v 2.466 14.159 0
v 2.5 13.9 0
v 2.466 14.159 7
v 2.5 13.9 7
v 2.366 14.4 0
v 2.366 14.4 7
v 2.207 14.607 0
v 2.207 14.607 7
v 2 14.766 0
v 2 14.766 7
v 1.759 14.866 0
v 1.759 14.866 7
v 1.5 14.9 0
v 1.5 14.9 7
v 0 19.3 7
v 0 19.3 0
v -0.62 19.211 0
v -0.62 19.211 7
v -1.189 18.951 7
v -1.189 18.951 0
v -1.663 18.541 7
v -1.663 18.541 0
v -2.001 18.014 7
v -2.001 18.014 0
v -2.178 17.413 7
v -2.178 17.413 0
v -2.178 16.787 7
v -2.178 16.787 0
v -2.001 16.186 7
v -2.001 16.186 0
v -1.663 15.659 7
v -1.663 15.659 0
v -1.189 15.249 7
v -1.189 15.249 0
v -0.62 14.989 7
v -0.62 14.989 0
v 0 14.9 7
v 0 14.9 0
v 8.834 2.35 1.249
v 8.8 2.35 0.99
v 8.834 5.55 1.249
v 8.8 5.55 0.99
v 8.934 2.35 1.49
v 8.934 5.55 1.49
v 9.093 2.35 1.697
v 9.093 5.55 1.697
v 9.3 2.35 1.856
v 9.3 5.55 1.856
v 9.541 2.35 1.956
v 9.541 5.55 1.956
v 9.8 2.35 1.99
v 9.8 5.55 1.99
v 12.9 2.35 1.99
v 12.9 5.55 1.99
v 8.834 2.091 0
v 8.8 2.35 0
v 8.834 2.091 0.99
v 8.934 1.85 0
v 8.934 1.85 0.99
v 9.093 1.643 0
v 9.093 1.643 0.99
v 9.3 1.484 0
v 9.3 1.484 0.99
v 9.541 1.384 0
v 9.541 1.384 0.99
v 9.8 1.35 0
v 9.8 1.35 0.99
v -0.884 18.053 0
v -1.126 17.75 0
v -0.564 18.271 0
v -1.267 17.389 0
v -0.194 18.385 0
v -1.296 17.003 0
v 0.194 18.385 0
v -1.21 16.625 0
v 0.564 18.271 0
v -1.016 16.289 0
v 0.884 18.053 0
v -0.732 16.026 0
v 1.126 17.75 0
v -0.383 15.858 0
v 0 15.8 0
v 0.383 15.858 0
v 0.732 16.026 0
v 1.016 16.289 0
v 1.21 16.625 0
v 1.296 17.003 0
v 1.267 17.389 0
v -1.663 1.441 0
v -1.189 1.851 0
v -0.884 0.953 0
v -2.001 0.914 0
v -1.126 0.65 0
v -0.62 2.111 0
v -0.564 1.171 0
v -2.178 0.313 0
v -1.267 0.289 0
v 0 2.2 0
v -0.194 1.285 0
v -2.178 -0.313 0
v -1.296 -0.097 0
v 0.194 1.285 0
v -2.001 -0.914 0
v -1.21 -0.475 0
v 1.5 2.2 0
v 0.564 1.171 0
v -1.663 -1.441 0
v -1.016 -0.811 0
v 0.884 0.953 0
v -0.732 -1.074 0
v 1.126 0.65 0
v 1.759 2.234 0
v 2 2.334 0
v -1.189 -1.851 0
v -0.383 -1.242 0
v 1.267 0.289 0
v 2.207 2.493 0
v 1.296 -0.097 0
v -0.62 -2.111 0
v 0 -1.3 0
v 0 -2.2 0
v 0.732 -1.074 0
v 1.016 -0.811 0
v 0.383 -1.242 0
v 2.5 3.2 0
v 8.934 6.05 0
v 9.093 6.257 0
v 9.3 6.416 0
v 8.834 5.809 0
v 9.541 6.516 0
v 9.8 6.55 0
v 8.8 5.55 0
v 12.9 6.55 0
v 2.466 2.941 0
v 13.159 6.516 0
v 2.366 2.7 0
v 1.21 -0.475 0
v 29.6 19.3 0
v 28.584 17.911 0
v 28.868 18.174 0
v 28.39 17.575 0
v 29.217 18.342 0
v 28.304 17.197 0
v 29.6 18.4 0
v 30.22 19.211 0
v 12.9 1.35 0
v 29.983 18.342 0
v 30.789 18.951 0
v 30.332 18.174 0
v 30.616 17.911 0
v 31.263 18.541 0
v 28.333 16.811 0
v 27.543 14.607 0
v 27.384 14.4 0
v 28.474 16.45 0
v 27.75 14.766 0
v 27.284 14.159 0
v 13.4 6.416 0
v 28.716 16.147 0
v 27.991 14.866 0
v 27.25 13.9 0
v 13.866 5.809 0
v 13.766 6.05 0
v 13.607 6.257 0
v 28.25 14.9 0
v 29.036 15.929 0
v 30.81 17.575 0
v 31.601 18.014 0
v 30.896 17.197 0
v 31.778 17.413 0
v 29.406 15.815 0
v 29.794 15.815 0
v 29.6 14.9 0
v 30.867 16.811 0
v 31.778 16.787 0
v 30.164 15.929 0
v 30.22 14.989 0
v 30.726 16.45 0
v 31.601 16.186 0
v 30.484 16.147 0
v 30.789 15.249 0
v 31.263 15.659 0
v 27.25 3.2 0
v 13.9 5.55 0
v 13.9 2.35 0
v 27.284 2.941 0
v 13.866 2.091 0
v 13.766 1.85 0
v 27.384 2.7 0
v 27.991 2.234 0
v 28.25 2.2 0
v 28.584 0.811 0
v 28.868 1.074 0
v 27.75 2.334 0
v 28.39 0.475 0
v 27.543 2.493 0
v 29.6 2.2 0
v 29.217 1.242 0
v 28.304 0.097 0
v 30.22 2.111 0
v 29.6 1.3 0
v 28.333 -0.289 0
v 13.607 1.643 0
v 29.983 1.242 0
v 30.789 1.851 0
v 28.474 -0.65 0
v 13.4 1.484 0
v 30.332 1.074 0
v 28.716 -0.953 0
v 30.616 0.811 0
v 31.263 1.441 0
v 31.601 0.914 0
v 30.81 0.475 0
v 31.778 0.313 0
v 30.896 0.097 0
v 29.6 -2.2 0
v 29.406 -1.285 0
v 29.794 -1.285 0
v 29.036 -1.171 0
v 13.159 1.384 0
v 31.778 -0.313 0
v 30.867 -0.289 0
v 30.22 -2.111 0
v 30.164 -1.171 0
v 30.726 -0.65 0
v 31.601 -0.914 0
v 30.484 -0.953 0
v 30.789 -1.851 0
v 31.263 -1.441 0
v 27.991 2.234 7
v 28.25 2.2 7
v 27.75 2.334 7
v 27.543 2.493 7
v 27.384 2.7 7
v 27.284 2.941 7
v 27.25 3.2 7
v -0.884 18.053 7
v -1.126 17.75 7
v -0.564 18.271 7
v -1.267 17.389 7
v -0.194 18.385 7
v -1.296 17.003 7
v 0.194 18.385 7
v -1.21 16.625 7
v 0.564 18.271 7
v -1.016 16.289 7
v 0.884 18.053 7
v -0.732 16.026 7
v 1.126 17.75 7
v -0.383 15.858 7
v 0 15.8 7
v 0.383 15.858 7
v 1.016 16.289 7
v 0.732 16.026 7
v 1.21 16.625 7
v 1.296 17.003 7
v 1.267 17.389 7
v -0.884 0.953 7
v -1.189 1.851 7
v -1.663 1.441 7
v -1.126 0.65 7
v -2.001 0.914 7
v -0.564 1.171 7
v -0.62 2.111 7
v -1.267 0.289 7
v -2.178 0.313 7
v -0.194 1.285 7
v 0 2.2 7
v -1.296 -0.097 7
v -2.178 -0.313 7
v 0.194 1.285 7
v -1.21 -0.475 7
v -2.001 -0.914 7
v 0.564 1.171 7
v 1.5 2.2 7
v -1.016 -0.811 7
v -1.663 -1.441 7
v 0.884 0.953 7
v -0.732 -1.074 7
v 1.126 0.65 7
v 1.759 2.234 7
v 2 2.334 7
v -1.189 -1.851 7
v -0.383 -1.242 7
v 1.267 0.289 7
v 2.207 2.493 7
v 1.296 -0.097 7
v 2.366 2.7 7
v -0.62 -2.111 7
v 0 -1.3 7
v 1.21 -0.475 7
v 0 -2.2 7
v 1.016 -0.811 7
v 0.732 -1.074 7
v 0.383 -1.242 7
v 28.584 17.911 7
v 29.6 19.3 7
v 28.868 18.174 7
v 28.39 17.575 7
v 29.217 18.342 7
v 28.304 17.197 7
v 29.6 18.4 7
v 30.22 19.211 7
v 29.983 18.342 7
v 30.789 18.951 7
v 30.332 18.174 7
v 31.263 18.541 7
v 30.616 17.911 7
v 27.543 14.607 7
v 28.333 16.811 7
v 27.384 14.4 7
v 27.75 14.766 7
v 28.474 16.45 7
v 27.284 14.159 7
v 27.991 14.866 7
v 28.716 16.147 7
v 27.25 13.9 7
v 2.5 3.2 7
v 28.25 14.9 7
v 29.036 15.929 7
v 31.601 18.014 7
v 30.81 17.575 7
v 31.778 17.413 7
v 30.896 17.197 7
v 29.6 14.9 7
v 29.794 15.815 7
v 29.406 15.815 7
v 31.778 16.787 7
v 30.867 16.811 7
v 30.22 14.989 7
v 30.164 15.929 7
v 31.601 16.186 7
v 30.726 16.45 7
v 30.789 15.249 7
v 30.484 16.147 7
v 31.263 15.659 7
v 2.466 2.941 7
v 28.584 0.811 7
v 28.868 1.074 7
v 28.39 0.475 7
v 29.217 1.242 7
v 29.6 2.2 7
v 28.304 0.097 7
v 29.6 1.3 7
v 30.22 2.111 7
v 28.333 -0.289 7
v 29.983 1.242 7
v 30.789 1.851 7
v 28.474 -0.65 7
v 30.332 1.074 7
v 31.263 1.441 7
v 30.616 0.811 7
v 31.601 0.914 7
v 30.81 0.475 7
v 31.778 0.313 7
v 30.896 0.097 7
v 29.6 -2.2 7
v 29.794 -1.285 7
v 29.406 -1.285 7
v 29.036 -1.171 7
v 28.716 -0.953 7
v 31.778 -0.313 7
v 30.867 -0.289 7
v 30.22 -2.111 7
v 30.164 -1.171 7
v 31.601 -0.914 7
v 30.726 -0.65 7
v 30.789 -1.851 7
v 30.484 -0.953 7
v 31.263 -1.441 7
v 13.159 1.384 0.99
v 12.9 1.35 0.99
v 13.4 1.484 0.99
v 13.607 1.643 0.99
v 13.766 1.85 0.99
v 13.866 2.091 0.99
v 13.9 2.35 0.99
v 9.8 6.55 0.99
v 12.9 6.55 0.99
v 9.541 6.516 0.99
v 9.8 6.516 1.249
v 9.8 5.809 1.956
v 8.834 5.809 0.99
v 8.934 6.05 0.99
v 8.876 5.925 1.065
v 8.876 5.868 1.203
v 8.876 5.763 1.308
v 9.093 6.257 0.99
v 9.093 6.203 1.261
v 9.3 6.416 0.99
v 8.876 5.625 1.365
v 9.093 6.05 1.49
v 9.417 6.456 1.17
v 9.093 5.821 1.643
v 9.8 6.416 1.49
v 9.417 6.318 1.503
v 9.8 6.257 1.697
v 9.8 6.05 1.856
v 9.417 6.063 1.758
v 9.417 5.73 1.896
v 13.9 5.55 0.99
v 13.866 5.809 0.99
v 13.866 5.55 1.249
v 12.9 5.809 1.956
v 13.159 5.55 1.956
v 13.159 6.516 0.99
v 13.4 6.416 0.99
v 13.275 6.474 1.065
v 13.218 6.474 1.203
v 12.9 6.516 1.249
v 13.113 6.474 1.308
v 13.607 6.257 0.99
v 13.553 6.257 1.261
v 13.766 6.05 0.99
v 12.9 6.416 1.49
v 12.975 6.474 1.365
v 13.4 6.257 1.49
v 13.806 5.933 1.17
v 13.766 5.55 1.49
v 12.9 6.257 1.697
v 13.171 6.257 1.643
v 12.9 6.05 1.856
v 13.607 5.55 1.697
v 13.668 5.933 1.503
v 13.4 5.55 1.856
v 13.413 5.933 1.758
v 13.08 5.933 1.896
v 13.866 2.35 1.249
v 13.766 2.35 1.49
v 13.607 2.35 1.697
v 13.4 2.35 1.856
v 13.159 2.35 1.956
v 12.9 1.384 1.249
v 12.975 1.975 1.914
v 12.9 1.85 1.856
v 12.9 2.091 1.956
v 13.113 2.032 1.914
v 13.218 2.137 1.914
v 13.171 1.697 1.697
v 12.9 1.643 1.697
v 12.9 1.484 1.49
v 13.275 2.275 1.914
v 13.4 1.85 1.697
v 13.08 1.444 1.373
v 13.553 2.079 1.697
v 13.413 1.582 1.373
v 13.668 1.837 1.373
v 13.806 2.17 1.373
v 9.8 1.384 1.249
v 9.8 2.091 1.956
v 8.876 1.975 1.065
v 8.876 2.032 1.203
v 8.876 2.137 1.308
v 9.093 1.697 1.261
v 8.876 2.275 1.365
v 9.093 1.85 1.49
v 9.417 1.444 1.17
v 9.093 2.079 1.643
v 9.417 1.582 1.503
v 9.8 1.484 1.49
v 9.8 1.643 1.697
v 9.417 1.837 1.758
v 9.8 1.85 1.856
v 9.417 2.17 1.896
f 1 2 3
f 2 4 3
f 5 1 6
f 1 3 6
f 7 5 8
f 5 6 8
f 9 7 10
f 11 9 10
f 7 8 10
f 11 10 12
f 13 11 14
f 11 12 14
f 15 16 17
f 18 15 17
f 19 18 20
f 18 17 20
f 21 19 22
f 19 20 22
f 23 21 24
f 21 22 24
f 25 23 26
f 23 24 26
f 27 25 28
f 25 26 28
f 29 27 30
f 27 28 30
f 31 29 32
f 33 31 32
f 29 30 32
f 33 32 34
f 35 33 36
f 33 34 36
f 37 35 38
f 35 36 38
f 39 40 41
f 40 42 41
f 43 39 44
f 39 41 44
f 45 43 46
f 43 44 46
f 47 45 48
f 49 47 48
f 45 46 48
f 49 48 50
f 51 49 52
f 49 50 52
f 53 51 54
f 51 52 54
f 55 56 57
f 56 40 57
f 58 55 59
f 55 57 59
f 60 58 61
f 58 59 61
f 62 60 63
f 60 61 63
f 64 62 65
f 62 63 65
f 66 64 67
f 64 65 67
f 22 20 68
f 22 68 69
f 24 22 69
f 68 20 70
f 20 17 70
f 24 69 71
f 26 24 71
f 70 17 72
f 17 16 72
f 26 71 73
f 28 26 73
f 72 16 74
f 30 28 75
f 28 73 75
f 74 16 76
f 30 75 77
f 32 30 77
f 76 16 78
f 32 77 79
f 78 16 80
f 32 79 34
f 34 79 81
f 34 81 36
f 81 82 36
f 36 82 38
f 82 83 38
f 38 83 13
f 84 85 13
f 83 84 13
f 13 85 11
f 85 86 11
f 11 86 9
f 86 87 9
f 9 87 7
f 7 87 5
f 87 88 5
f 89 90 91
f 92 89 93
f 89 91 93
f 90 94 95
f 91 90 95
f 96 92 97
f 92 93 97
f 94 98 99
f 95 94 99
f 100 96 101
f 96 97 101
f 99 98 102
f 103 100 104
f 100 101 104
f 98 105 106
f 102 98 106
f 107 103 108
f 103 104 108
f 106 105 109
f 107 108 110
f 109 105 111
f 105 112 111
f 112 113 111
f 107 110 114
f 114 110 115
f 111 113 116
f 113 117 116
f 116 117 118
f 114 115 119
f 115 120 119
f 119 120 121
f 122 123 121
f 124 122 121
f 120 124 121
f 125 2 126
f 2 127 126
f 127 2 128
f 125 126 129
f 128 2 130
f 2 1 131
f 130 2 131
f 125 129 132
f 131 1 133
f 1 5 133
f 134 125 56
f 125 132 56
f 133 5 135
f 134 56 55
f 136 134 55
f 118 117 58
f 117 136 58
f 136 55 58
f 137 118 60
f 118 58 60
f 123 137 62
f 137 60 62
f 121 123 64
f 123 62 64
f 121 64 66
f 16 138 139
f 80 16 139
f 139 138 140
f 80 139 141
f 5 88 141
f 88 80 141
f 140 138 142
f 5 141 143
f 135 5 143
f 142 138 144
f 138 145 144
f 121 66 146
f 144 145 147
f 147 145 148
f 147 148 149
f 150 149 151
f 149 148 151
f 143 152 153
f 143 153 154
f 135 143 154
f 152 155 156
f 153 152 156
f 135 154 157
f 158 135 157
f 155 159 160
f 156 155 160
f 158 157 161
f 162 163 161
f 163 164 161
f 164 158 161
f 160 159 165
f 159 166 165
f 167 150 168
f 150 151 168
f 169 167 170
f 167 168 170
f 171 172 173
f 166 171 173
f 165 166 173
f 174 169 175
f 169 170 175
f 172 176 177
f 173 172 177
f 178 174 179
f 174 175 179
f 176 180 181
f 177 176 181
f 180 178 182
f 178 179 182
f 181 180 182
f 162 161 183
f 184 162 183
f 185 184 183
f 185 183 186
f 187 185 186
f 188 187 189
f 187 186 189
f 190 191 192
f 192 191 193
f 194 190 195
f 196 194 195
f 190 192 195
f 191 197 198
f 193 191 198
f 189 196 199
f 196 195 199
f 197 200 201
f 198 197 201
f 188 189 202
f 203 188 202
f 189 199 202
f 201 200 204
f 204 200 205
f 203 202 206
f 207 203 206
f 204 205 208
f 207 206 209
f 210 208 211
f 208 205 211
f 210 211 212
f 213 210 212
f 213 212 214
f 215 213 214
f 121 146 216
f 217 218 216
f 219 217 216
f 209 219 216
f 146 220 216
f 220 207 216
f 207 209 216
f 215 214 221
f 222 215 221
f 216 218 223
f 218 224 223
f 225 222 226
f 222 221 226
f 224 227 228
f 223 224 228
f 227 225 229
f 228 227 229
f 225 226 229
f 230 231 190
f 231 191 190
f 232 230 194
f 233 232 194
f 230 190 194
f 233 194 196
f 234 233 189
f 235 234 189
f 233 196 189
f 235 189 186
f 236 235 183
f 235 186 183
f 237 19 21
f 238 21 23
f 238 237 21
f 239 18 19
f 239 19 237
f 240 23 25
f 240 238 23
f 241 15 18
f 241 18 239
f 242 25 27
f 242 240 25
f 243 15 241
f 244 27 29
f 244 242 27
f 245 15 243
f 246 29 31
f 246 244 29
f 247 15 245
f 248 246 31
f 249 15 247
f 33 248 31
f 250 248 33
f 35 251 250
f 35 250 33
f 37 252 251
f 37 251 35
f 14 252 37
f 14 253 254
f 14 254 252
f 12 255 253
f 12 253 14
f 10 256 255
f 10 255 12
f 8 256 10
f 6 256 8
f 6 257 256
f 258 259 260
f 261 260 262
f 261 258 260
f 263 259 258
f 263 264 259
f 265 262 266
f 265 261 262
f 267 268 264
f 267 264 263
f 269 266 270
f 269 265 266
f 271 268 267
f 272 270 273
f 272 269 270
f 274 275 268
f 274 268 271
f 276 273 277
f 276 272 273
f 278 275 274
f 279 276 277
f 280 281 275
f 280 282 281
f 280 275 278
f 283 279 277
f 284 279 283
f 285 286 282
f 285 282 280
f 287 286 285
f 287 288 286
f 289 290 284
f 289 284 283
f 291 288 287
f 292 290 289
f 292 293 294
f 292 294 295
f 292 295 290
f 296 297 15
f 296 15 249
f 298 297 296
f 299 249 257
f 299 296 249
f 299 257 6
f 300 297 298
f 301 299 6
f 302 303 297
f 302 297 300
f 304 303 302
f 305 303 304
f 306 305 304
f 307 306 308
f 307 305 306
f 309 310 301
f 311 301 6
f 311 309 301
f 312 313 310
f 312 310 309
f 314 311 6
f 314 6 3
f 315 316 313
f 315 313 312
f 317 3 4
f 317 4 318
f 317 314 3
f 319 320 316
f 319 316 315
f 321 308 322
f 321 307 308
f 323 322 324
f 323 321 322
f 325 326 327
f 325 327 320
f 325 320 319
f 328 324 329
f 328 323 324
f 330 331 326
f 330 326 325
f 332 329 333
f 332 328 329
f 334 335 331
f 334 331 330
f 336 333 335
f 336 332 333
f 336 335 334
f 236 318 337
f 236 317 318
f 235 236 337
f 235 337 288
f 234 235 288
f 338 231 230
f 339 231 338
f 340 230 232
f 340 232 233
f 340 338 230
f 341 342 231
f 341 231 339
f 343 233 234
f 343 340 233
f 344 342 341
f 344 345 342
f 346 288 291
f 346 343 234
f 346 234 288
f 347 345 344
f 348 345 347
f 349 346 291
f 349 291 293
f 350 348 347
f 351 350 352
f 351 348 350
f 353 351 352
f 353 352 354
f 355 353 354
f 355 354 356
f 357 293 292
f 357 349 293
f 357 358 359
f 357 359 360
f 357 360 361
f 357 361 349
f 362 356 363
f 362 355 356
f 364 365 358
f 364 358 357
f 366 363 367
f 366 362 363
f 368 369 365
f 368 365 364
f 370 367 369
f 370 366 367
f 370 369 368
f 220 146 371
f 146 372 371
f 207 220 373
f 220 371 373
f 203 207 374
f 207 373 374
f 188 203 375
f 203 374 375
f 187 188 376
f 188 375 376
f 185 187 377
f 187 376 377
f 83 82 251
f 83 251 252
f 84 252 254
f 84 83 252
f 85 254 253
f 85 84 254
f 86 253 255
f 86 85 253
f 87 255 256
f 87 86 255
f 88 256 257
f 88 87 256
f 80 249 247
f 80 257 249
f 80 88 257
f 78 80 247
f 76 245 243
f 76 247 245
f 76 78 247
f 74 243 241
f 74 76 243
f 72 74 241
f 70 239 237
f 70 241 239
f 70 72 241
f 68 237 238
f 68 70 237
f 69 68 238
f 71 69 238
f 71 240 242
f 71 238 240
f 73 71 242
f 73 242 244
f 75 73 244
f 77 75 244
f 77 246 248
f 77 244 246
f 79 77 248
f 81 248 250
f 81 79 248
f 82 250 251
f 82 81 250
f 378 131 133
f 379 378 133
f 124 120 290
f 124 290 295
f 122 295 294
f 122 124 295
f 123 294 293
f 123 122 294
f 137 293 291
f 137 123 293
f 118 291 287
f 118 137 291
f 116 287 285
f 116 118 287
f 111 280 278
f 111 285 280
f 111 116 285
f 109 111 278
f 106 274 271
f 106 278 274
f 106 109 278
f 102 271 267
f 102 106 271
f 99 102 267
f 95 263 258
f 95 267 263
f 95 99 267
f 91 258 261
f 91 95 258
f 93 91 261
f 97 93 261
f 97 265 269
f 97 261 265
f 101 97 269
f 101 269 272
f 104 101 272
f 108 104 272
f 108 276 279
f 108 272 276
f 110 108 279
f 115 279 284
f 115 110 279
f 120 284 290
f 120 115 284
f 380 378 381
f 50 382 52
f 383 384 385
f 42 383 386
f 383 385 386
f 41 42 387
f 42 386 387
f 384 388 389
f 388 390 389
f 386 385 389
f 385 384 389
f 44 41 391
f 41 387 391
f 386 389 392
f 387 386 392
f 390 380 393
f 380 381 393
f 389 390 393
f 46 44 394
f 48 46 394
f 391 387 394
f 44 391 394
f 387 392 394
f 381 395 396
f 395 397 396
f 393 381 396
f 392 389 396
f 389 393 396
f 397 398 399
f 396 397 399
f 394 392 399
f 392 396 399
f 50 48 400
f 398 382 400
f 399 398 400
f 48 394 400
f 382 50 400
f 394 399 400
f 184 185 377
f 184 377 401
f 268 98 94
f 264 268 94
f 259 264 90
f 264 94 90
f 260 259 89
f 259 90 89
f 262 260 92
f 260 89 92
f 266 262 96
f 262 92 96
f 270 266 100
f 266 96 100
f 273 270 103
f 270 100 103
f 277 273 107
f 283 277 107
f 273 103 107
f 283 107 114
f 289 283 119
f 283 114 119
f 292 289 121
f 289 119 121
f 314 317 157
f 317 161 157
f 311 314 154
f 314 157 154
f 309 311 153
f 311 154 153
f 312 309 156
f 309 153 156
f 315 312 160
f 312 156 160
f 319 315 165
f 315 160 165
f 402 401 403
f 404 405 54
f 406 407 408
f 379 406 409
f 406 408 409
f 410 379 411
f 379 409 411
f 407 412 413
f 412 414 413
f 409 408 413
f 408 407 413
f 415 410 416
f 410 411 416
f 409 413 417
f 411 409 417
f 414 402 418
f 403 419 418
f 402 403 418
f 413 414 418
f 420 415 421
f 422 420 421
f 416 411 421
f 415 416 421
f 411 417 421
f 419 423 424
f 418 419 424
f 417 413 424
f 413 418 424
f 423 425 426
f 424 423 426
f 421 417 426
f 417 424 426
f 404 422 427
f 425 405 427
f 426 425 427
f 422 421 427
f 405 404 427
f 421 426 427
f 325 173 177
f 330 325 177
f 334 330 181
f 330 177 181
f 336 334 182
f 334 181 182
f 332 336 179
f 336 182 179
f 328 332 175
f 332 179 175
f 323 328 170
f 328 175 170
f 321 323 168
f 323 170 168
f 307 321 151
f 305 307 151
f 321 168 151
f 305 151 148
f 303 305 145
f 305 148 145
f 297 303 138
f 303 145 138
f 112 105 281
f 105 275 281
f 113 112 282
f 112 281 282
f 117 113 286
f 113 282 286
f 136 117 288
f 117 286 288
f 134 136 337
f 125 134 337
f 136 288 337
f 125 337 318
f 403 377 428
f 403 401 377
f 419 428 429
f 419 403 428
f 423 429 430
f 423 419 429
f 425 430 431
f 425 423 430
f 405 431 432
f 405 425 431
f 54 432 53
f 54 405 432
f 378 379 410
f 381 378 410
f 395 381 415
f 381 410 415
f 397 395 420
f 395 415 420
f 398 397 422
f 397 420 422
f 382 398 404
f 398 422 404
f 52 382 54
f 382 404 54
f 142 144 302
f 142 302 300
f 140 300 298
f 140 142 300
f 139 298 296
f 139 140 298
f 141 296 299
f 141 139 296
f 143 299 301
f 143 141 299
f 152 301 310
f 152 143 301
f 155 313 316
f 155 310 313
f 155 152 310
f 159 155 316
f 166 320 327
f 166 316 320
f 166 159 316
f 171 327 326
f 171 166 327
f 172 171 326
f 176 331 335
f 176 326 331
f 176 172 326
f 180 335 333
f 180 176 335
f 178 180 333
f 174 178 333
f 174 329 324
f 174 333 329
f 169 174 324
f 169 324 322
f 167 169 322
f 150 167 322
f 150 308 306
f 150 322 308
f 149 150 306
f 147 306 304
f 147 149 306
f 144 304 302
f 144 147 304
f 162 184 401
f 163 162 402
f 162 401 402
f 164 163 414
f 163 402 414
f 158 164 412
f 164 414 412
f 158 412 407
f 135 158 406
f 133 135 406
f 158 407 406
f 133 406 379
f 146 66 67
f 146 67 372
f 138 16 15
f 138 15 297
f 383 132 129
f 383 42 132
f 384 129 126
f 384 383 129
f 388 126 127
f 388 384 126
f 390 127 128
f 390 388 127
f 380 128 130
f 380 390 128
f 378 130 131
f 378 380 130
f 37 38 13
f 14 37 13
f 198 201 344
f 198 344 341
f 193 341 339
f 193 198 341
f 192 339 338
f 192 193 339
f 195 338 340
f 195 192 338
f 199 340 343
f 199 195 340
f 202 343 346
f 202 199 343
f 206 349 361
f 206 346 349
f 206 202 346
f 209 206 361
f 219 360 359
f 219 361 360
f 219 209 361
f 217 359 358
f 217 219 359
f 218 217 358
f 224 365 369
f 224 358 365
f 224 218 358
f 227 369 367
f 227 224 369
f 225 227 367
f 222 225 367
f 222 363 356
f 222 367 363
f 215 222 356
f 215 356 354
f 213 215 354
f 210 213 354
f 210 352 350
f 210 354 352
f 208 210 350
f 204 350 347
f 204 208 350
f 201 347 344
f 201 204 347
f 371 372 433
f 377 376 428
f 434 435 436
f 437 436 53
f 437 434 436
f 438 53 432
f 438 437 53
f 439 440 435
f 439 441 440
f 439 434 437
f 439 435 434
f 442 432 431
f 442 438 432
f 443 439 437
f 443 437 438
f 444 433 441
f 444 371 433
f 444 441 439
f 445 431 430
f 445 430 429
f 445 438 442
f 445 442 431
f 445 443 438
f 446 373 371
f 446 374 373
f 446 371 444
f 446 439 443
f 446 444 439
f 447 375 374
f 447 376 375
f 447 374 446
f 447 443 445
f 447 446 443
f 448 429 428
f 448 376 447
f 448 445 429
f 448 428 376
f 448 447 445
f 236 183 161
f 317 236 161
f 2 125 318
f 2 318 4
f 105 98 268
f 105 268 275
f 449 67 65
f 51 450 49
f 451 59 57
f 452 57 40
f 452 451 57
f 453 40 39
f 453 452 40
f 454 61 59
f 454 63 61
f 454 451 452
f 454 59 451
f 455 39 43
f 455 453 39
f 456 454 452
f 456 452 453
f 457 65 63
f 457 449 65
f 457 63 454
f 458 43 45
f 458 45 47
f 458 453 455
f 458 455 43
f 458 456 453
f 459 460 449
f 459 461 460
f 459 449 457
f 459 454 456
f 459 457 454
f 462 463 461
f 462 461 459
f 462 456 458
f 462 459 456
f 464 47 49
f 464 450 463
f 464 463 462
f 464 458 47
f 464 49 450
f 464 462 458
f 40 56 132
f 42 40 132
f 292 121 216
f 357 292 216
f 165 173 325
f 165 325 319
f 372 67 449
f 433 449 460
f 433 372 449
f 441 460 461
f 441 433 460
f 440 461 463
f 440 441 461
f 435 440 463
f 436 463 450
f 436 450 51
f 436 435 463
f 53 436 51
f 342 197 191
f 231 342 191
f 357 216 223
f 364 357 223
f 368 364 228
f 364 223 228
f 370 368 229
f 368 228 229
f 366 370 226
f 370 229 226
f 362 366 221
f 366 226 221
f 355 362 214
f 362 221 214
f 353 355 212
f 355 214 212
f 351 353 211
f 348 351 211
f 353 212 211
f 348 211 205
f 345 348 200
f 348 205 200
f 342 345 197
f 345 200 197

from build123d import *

# Parameters (mm, degrees)
CUBE005_W                     = 5.1
CUBE005_H                     = 5.2
CUBE005_DEPTH                 = 2
CYLINDER003_R                 = 1.3
CYLINDER003_DEPTH             = 7.1
CUBE001_W                     = 4.4
CUBE001_H                     = 5
CUBE001_DEPTH                 = 7
CYLINDER002_R                 = 2.2
CYLINDER002_DEPTH             = 7
DIFFERENCE001_PLACEMENT_ANGLE = 90
CYLINDER005_R                 = 1.3
CYLINDER005_DEPTH             = 7.1
CUBE002_W                     = 4.4
CUBE002_H                     = 5
CUBE002_DEPTH                 = 7
CYLINDER004_R                 = 2.2
CYLINDER004_DEPTH             = 7
DIFFERENCE002_PLACEMENT_ANGLE = 90
CYLINDER007_R                 = 1.3
CYLINDER007_DEPTH             = 7.1
CUBE003_W                     = 4.4
CUBE003_H                     = 5
CUBE003_DEPTH                 = 7
CYLINDER006_R                 = 2.2
CYLINDER006_DEPTH             = 7
DIFFERENCE003_PLACEMENT_ANGLE = 90
CUBE004_W                     = 24.75
CUBE004_H                     = 21.5
CUBE004_DEPTH                 = 7
CYLINDER001_R                 = 1.3
CYLINDER001_DEPTH             = 7.1
CUBE_W                        = 4.4
CUBE_H                        = 5
CUBE_DEPTH                    = 7
CYLINDER_R                    = 2.2
CYLINDER_DEPTH                = 7
DIFFERENCE_PLACEMENT_ANGLE    = 90
FILLET_R                      = 1


with BuildPart() as cube005:
    # cube005 → cube005 (new body)
    with BuildSketch(Plane(origin=(8.8, 1.35, -0.01), x_dir=(1, 0, 0), z_dir=(0, 0, 1))):
        with Locations((2.55, 2.6)):
            Rectangle(CUBE005_W, CUBE005_H)
    extrude(amount=CUBE005_DEPTH)


with BuildPart() as cylinder003:
    # cylinder003 → cylinder003 (new body)
    with BuildSketch(Plane.XY.offset(-0.01)):
        Circle(CYLINDER003_R)
    extrude(amount=CYLINDER003_DEPTH)


with BuildPart() as cube001:
    # cube001 → cube001 (new body)
    with BuildSketch(Plane(origin=(-2.2, 0, 0), x_dir=(1, 0, 0), z_dir=(0, 0, 1))):
        with Locations((2.2, 2.5)):
            Rectangle(CUBE001_W, CUBE001_H)
    extrude(amount=CUBE001_DEPTH)


with BuildPart() as difference001:
    # cylinder002 → cylinder002 (new body)
    with BuildSketch(Plane.XY):
        Circle(CYLINDER002_R)
    extrude(amount=CYLINDER002_DEPTH)

    # union001: union cube001
    add(cube001.part)

    # difference001: cut cylinder003
    add(cylinder003.part, mode=Mode.SUBTRACT)


with BuildPart() as difference001_1:
    # difference001 placement: moved
    add(difference001.part.moved(Location((29.6, 0, 0))).rotate(Axis((29.6, 0, 0), (0, 0, 1)), DIFFERENCE001_PLACEMENT_ANGLE))


with BuildPart() as cylinder005:
    # cylinder005 → cylinder005 (new body)
    with BuildSketch(Plane.XY.offset(-0.01)):
        Circle(CYLINDER005_R)
    extrude(amount=CYLINDER005_DEPTH)


with BuildPart() as cube002:
    # cube002 → cube002 (new body)
    with BuildSketch(Plane(origin=(-2.2, 0, 0), x_dir=(1, 0, 0), z_dir=(0, 0, 1))):
        with Locations((2.2, 2.5)):
            Rectangle(CUBE002_W, CUBE002_H)
    extrude(amount=CUBE002_DEPTH)


with BuildPart() as difference002:
    # cylinder004 → cylinder004 (new body)
    with BuildSketch(Plane.XY):
        Circle(CYLINDER004_R)
    extrude(amount=CYLINDER004_DEPTH)

    # union002: union cube002
    add(cube002.part)

    # difference002: cut cylinder005
    add(cylinder005.part, mode=Mode.SUBTRACT)


with BuildPart() as difference002_1:
    # difference002 placement: moved
    add(difference002.part.moved(Location((29.6, 17.1, 0))).rotate(Axis((29.6, 17.1, 0), (0, 0, 1)), DIFFERENCE002_PLACEMENT_ANGLE))


with BuildPart() as cylinder007:
    # cylinder007 → cylinder007 (new body)
    with BuildSketch(Plane.XY.offset(-0.01)):
        Circle(CYLINDER007_R)
    extrude(amount=CYLINDER007_DEPTH)


with BuildPart() as cube003:
    # cube003 → cube003 (new body)
    with BuildSketch(Plane(origin=(-2.2, 0, 0), x_dir=(1, 0, 0), z_dir=(0, 0, 1))):
        with Locations((2.2, 2.5)):
            Rectangle(CUBE003_W, CUBE003_H)
    extrude(amount=CUBE003_DEPTH)


with BuildPart() as difference003:
    # cylinder006 → cylinder006 (new body)
    with BuildSketch(Plane.XY):
        Circle(CYLINDER006_R)
    extrude(amount=CYLINDER006_DEPTH)

    # union003: union cube003
    add(cube003.part)

    # difference003: cut cylinder007
    add(cylinder007.part, mode=Mode.SUBTRACT)


with BuildPart() as difference003_1:
    # difference003 placement: moved
    add(difference003.part.moved(Location((0, 17.1, 0))).rotate(Axis((0, 17.1, 0), (0, 0, -1)), DIFFERENCE003_PLACEMENT_ANGLE))


with BuildPart() as cube004:
    # cube004 → cube004 (new body)
    with BuildSketch(Plane(origin=(2.5, -2.2, 0), x_dir=(1, 0, 0), z_dir=(0, 0, 1))):
        with Locations((12.375, 10.75)):
            Rectangle(CUBE004_W, CUBE004_H)
    extrude(amount=CUBE004_DEPTH)


with BuildPart() as cylinder001:
    # cylinder001 → cylinder001 (new body)
    with BuildSketch(Plane.XY.offset(-0.01)):
        Circle(CYLINDER001_R)
    extrude(amount=CYLINDER001_DEPTH)


with BuildPart() as cube:
    # cube → cube (new body)
    with BuildSketch(Plane(origin=(-2.2, 0, 0), x_dir=(1, 0, 0), z_dir=(0, 0, 1))):
        with Locations((2.2, 2.5)):
            Rectangle(CUBE_W, CUBE_H)
    extrude(amount=CUBE_DEPTH)


with BuildPart() as fillet_body:
    # cylinder → cylinder (new body)
    with BuildSketch(Plane.XY):
        Circle(CYLINDER_R)
    extrude(amount=CYLINDER_DEPTH)

    # union: union cube
    add(cube.part)

    # difference: cut cylinder001
    add(cylinder001.part, mode=Mode.SUBTRACT)


with BuildPart() as fillet_body_1:
    # difference placement: moved
    add(fillet_body.part.rotate(Axis((0, 0, 0), (0, 0, -1)), DIFFERENCE_PLACEMENT_ANGLE))

    # union004: union difference001, difference002, difference003, cube004
    add(difference001_1.part)
    add(difference002_1.part)
    add(difference003_1.part)
    add(cube004.part)

    # difference004: cut cube005
    add(cube005.part, mode=Mode.SUBTRACT)

    # Fillet
    fillet_edges = [fillet_body_1.edges().sort_by_distance(p)[0] for p in [
        (2.5, 2.2, 3.5),
        (2.5, 14.9, 3.5),
        (27.25, 14.9, 3.5),
        (27.25, 2.2, 3.5),
        (13.9, 1.35, 0.995),
        (11.35, 1.35, 1.99),
        (8.8, 1.35, 0.995),
        (13.9, 3.95, 1.99),
        (13.9, 6.55, 0.995),
        (11.35, 6.55, 1.99),
        (8.8, 6.55, 0.995),
        (8.8, 3.95, 1.99),
    ]]
    fillet(fillet_edges, radius=FILLET_R)


solid = fillet_body_1.part
